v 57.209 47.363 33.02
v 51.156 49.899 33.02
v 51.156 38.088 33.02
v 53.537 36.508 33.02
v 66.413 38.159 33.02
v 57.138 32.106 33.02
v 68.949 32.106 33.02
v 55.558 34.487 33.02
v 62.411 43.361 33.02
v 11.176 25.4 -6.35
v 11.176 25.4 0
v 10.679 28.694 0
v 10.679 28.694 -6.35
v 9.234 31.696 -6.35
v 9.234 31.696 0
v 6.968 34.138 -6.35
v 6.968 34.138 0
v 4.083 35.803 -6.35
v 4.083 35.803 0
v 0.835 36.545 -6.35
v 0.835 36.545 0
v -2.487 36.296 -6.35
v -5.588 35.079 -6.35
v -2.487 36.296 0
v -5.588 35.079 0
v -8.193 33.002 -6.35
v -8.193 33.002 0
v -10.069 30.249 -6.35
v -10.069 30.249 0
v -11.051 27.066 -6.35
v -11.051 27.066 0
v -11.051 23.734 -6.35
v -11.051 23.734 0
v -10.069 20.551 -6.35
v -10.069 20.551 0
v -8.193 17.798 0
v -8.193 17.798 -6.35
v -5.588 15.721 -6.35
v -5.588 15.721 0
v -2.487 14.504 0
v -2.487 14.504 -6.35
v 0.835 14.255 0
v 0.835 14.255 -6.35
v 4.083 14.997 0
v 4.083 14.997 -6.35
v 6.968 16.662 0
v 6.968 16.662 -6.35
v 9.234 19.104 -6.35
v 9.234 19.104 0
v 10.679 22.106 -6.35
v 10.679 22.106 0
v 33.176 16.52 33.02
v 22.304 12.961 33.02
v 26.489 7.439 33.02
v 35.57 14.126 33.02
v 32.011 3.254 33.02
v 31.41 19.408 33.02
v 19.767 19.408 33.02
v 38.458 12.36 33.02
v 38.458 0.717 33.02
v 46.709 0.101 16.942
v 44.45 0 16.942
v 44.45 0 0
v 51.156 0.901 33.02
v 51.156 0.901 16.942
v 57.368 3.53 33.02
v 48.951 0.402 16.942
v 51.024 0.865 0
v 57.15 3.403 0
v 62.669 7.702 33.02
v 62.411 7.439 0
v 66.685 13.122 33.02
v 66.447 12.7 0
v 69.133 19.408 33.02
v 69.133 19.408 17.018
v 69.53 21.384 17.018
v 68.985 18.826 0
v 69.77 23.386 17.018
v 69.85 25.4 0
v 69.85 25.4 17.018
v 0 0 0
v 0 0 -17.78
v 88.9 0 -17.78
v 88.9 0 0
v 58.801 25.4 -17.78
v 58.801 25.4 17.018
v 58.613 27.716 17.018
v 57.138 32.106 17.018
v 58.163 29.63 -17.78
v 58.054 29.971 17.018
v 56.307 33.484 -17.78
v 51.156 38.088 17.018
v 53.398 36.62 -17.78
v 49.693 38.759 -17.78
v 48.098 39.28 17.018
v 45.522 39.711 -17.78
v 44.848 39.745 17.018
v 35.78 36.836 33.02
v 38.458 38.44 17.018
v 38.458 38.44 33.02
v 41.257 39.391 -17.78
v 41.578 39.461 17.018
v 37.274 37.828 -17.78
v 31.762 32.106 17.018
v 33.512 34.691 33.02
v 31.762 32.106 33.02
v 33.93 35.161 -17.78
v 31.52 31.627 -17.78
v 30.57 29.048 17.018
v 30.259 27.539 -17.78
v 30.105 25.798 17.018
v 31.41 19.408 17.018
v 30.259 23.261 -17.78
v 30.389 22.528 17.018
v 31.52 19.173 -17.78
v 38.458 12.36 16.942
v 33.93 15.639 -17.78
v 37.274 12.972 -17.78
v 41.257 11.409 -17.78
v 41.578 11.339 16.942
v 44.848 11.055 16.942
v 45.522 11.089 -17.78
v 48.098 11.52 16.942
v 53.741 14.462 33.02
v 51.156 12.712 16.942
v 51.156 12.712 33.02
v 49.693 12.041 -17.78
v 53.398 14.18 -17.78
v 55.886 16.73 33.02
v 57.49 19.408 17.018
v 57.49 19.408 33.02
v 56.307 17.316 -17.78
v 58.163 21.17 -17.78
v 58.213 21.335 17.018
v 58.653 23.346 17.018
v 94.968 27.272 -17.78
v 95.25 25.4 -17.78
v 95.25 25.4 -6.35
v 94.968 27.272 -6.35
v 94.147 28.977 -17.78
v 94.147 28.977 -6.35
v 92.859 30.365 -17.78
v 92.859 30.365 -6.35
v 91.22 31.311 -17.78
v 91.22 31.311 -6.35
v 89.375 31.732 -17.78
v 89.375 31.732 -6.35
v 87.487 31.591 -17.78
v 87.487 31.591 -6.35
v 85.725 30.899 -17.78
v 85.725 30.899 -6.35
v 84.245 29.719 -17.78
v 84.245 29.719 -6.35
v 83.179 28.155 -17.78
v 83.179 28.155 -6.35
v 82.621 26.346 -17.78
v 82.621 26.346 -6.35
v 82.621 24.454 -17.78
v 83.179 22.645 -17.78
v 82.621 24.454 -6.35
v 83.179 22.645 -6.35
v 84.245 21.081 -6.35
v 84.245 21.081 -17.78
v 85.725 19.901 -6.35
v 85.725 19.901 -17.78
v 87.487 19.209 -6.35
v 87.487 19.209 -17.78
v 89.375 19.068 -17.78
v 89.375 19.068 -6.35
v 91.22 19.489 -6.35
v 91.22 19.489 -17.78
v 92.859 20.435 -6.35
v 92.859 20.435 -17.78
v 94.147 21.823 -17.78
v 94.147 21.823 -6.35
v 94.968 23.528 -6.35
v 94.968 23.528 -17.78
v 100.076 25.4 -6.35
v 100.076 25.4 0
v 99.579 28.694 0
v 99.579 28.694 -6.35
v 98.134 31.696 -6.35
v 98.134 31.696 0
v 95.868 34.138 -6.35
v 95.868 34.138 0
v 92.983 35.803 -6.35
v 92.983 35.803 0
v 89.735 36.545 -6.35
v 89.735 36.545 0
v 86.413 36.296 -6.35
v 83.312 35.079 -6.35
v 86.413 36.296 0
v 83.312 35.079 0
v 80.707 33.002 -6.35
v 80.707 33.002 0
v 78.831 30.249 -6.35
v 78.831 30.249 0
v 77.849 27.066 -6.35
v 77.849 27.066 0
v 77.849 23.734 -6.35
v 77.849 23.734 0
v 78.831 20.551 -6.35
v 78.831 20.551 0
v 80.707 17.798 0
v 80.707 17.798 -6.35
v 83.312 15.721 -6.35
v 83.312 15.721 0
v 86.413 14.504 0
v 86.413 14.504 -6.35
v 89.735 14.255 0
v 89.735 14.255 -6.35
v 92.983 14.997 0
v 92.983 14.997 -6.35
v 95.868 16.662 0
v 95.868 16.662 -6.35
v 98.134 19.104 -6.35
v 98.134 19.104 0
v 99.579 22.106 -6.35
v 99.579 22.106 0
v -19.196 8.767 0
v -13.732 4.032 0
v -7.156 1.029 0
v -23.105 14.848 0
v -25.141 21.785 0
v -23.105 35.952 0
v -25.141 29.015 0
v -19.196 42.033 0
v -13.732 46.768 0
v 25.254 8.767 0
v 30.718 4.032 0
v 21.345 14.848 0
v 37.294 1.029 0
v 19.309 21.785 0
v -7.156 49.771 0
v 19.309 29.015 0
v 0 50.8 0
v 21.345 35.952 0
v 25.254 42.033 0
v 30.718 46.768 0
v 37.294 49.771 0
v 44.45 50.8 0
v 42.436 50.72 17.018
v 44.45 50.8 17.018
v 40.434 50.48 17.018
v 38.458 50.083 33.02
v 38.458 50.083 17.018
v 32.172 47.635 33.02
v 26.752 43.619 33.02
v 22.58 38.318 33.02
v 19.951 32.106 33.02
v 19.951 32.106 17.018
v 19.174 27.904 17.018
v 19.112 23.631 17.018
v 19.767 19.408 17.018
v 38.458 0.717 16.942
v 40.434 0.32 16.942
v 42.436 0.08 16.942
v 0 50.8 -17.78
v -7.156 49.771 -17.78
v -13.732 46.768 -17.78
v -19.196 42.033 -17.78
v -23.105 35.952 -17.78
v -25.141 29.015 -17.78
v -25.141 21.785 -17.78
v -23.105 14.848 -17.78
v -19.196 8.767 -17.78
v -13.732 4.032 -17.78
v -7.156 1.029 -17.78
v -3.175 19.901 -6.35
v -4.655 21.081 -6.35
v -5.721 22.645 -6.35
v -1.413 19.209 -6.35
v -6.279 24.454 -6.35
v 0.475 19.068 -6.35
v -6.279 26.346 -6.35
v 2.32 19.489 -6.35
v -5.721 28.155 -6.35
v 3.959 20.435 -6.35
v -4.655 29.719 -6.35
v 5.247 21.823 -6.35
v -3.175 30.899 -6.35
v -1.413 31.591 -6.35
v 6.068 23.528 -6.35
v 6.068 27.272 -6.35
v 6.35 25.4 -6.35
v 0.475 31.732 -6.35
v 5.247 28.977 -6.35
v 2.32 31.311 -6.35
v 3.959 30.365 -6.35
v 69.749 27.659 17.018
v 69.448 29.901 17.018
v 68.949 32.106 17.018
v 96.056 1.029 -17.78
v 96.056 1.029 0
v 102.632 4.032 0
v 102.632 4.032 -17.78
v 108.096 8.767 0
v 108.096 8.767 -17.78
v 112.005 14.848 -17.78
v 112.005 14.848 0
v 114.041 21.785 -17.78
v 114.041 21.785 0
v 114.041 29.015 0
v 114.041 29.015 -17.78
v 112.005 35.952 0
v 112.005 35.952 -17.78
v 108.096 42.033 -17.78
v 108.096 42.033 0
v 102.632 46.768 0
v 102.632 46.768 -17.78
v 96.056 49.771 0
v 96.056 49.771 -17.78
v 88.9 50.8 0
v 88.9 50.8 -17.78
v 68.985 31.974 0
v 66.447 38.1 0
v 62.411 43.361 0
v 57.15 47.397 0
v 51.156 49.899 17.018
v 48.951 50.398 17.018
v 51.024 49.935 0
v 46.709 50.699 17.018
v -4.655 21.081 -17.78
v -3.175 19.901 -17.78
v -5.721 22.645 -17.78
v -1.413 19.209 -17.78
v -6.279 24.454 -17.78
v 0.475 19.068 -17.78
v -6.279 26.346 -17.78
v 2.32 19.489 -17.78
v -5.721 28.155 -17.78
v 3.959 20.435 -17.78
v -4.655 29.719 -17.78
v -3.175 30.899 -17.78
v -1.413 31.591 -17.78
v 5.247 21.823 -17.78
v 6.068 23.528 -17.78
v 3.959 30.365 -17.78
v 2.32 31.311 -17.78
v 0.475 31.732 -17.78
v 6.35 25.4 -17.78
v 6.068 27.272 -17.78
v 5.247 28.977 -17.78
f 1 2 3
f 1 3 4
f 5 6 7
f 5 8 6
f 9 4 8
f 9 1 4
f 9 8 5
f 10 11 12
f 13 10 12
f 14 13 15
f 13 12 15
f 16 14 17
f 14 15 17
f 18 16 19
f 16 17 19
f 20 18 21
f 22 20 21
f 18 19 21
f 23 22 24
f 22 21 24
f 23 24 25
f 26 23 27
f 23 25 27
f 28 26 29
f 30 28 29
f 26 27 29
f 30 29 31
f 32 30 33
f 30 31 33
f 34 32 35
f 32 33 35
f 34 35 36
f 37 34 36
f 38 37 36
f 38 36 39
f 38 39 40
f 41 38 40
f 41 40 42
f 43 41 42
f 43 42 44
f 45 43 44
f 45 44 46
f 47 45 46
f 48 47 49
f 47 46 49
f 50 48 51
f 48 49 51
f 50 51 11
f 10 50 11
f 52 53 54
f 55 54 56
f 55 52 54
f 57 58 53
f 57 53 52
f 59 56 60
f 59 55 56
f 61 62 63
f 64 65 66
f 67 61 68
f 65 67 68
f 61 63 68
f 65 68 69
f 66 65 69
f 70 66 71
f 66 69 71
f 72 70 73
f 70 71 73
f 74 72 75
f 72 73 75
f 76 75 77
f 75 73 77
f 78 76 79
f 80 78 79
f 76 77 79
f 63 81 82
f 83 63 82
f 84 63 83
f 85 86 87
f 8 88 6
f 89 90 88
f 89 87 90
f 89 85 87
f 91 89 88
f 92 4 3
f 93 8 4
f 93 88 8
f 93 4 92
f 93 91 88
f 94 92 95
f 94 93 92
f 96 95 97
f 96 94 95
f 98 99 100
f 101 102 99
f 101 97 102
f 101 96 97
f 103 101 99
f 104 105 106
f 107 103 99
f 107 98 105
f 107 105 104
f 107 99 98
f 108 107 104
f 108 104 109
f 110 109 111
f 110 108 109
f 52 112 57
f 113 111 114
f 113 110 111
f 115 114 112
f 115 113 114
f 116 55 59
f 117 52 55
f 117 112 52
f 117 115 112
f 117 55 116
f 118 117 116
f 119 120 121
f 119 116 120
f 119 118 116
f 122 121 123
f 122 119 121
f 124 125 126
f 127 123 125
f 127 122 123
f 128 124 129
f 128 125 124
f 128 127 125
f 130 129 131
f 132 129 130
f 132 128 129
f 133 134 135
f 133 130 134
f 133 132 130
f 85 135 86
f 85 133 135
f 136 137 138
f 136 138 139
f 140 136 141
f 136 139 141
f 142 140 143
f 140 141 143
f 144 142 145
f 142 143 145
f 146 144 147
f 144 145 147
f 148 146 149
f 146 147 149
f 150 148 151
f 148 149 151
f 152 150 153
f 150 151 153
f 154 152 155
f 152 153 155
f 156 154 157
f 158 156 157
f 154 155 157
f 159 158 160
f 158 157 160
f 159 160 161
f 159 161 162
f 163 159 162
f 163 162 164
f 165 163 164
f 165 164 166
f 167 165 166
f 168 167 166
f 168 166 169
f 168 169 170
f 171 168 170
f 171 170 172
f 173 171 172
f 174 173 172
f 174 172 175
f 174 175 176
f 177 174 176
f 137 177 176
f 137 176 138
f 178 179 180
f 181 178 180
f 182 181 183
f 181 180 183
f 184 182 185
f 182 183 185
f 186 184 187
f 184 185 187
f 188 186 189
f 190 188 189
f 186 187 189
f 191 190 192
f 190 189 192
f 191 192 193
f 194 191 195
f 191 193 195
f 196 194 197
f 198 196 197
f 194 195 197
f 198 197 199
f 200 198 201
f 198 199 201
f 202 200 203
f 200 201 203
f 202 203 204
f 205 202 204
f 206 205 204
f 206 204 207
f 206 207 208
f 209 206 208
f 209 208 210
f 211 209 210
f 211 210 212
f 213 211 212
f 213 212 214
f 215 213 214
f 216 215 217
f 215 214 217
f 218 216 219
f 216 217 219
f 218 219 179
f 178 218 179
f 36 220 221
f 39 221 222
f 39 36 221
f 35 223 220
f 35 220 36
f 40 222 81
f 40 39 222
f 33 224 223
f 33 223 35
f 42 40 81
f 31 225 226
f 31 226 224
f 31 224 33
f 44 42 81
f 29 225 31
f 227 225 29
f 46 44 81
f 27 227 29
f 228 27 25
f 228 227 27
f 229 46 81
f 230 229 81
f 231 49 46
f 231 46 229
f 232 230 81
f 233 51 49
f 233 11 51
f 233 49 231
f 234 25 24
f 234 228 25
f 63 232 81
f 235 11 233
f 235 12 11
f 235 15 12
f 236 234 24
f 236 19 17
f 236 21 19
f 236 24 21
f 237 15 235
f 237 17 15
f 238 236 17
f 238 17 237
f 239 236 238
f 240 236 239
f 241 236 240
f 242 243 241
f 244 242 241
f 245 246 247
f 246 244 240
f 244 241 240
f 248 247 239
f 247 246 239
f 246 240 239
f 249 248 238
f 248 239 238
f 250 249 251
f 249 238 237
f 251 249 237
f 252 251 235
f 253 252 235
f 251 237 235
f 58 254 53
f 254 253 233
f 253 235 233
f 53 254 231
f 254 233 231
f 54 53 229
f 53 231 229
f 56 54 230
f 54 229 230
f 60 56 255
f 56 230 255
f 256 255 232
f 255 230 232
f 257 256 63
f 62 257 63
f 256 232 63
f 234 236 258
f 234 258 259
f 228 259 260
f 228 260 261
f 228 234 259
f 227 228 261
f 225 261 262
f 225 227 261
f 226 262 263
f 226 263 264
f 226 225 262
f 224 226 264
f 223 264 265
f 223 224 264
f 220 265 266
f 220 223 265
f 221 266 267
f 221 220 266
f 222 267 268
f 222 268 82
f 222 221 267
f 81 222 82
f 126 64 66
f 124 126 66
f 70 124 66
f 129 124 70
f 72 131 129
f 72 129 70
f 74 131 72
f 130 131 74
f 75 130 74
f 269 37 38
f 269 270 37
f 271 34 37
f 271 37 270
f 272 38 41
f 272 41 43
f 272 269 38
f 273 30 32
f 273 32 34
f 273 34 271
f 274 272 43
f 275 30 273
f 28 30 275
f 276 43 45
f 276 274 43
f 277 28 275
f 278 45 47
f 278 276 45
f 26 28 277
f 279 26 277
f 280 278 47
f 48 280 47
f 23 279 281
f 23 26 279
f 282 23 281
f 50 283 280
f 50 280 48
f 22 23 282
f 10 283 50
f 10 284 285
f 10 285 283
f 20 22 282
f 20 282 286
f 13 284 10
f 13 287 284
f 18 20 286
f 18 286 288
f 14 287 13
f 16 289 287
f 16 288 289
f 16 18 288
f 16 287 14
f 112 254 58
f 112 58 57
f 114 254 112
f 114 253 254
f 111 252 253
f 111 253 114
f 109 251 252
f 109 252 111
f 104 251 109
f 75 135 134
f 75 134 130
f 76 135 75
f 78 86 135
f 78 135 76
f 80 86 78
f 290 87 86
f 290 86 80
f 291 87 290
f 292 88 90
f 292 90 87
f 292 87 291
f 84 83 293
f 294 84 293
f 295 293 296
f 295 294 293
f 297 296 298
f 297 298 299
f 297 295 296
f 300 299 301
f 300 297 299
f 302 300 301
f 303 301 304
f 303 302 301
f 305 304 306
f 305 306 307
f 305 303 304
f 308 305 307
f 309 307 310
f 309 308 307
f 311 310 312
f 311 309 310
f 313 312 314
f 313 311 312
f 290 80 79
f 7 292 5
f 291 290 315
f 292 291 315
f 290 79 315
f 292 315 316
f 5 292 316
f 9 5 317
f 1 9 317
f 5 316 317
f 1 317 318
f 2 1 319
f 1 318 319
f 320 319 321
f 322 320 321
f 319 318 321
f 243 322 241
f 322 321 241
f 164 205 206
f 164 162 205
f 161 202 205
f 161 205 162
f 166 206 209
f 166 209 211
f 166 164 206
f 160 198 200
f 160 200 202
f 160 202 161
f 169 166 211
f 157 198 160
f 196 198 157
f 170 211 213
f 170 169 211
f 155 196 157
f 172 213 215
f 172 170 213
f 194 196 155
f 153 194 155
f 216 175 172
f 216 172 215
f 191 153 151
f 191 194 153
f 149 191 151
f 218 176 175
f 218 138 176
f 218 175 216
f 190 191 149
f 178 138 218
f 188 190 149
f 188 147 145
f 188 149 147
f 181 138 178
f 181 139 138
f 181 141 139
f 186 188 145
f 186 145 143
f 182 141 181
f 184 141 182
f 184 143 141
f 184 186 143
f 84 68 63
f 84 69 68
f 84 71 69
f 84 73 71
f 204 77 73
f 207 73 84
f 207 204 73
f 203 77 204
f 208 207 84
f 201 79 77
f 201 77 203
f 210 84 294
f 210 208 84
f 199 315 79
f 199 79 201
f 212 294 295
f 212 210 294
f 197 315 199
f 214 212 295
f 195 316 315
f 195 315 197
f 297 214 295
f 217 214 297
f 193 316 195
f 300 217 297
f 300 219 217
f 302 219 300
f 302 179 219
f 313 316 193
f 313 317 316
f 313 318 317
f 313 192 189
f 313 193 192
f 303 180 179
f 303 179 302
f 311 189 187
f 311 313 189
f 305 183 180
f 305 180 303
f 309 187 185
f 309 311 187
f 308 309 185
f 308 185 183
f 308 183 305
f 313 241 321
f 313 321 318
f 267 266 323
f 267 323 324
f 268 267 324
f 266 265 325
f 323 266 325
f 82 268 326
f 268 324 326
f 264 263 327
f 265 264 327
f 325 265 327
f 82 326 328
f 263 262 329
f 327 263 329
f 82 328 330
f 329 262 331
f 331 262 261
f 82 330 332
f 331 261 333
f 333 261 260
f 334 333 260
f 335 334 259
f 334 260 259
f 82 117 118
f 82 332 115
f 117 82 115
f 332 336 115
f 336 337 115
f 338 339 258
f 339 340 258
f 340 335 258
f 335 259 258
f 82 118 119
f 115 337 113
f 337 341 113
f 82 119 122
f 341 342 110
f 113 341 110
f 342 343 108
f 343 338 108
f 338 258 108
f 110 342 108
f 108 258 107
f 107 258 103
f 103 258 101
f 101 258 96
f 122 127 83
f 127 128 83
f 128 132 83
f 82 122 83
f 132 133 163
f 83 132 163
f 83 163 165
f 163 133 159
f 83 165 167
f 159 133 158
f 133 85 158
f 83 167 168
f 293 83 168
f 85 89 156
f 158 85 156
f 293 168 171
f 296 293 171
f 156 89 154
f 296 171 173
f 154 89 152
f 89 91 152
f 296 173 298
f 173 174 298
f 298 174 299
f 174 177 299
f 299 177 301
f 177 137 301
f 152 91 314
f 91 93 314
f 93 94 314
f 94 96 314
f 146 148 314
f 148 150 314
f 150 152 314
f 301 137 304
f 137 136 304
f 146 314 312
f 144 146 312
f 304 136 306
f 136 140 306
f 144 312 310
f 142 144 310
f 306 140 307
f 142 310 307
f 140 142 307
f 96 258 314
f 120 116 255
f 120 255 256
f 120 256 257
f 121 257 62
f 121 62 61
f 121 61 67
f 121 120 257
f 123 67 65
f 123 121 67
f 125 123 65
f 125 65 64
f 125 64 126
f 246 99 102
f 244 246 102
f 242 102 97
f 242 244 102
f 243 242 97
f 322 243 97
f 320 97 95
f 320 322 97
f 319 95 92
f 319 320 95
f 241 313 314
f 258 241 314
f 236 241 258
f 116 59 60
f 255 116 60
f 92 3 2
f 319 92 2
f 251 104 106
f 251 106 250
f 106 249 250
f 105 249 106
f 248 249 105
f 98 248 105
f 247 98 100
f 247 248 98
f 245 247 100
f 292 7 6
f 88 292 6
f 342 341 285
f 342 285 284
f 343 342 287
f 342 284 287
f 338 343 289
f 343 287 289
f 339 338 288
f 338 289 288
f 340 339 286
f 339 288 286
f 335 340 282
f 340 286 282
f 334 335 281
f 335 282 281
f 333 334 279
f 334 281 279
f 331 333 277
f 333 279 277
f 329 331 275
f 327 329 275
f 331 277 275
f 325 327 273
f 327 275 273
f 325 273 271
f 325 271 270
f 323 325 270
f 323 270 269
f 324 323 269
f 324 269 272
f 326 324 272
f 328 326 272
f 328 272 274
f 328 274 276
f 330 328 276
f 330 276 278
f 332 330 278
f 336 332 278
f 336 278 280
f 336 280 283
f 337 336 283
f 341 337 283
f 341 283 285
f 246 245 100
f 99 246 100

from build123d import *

# Parameters (mm, degrees)
F0_R     = 6.35
F0_R_2   = 14.351
F1_DEPTH = 17.78
F2_DEPTH = 33.02
F4_DEPTH = 16.002
F5_DEPTH = 16.0782
F6_DEPTH = 16.002
F7_DEPTH = 16.002
F8_R     = 11.176
F8_R_2   = 6.35
F9_DEPTH = 6.35


with BuildPart() as f1:
    # F0 (on Top) → F1 (new body)
    with BuildSketch(Plane.XY):
        with BuildLine():
            Line((44.45, 50.8), (0, 50.8))
            ThreePointArc((0, 50.8), (-25.4, 25.4), (0, 0))
            Line((0, 0), (44.45, 0))
            ThreePointArc((44.45, 0), (19.05, 25.4), (44.45, 50.8))
        make_face()
        with Locations((0, 25.4)):
            Circle(F0_R, mode=Mode.SUBTRACT)
        with BuildLine():
            Line((88.9, 50.8), (44.45, 50.8))
            ThreePointArc((44.45, 50.8), (62.4105122421, 43.3605122421), (69.85, 25.4))
            ThreePointArc((69.85, 25.4), (62.4105122421, 7.4394877579), (44.45, 0))
            Line((44.45, 0), (88.9, 0))
            ThreePointArc((88.9, 0), (114.3, 25.4), (88.9, 50.8))
        make_face()
        with Locations((88.9, 25.4)):
            Circle(F0_R, mode=Mode.SUBTRACT)
        with BuildLine():
            ThreePointArc((69.85, 25.4), (62.4105122421, 43.3605122421), (44.45, 50.8))
            ThreePointArc((44.45, 50.8), (19.05, 25.4), (44.45, 0))
            ThreePointArc((44.45, 0), (62.4105122421, 7.4394877579), (69.85, 25.4))
        make_face()
        with Locations((44.45, 25.4)):
            Circle(F0_R_2, mode=Mode.SUBTRACT)
    extrude(amount=-F1_DEPTH)

    # F0 (on Top) → F2 (join)
    with BuildSketch(Plane.XY):
        with BuildLine():
            ThreePointArc((69.85, 25.4), (62.4105122421, 43.3605122421), (44.45, 50.8))
            ThreePointArc((44.45, 50.8), (19.05, 25.4), (44.45, 0))
            ThreePointArc((44.45, 0), (62.4105122421, 7.4394877579), (69.85, 25.4))
        make_face()
        with Locations((44.45, 25.4)):
            Circle(F0_R_2, mode=Mode.SUBTRACT)
    extrude(amount=F2_DEPTH)

    # F3 (on face) → F4 (cut)
    with BuildSketch(Plane.XY.offset(33.02)):
        with BuildLine():
            ThreePointArc((58.801, 25.4), (58.4694202402, 22.3329073818), (57.4900032571, 19.4075450727))
            Line((57.4900032571, 19.4075450727), (69.1329998976, 19.4075450727))
            ThreePointArc((69.1329998976, 19.4075450727), (69.6701129795, 22.3824014017), (69.85, 25.4))
            ThreePointArc((69.85, 25.4), (69.6236690394, 28.7832509657), (68.9487096774, 32.1062078809))
            Line((68.9487096774, 32.1062078809), (57.1377096774, 32.1062078809))
            ThreePointArc((57.1377096774, 32.1062078809), (58.3789720113, 28.8546982082), (58.801, 25.4))
        make_face()
    extrude(amount=-F4_DEPTH, mode=Mode.SUBTRACT)

    # F3 (on face) → F5 (cut)
    with BuildSketch(Plane.XY.offset(33.02)):
        with BuildLine():
            ThreePointArc((51.1562078809, 12.7122903226), (44.8479805413, 11.0545194403), (38.4575450727, 12.3599967429))
            Line((38.4575450727, 12.3599967429), (38.4575450727, 0.7170001024))
            ThreePointArc((38.4575450727, 0.7170001024), (44.8185804404, 0.0026743837), (51.1562078809, 0.9012903226))
            Line((51.1562078809, 0.9012903226), (51.1562078809, 12.7122903226))
        make_face()
    extrude(amount=-F5_DEPTH, mode=Mode.SUBTRACT)

    # F3 (on face) → F6 (cut)
    with BuildSketch(Plane.XY.offset(33.02)):
        with BuildLine():
            Line((19.7670001024, 19.4075450727), (31.4099967429, 19.4075450727))
            ThreePointArc((31.4099967429, 19.4075450727), (30.1045194403, 25.7979805413), (31.7622903226, 32.1062078809))
            Line((31.7622903226, 32.1062078809), (19.9512903226, 32.1062078809))
            ThreePointArc((19.9512903226, 32.1062078809), (19.0526743837, 25.7685804404), (19.7670001024, 19.4075450727))
        make_face()
    extrude(amount=-F6_DEPTH, mode=Mode.SUBTRACT)

    # F3 (on face) → F7 (cut)
    with BuildSketch(Plane.XY.offset(33.02)):
        with BuildLine():
            Line((38.4575450727, 50.0829998976), (38.4575450727, 38.4400032571))
            ThreePointArc((38.4575450727, 38.4400032571), (44.8479805413, 39.7454805597), (51.1562078809, 38.0877096774))
            Line((51.1562078809, 38.0877096774), (51.1562078809, 49.8987096774))
            ThreePointArc((51.1562078809, 49.8987096774), (44.8185804404, 50.7973256163), (38.4575450727, 50.0829998976))
        make_face()
    extrude(amount=-F7_DEPTH, mode=Mode.SUBTRACT)

    # F8 (on Top) → F9 (cut)
    with BuildSketch(Plane.XY):
        with Locations((0, 25.4)):
            Circle(F8_R)
        with Locations((0, 25.4)):
            Circle(F8_R_2, mode=Mode.SUBTRACT)
        with Locations((88.9, 25.4)):
            Circle(F8_R)
        with Locations((88.9, 25.4)):
            Circle(F8_R_2, mode=Mode.SUBTRACT)
    extrude(amount=-F9_DEPTH, mode=Mode.SUBTRACT)


solid = f1.part
